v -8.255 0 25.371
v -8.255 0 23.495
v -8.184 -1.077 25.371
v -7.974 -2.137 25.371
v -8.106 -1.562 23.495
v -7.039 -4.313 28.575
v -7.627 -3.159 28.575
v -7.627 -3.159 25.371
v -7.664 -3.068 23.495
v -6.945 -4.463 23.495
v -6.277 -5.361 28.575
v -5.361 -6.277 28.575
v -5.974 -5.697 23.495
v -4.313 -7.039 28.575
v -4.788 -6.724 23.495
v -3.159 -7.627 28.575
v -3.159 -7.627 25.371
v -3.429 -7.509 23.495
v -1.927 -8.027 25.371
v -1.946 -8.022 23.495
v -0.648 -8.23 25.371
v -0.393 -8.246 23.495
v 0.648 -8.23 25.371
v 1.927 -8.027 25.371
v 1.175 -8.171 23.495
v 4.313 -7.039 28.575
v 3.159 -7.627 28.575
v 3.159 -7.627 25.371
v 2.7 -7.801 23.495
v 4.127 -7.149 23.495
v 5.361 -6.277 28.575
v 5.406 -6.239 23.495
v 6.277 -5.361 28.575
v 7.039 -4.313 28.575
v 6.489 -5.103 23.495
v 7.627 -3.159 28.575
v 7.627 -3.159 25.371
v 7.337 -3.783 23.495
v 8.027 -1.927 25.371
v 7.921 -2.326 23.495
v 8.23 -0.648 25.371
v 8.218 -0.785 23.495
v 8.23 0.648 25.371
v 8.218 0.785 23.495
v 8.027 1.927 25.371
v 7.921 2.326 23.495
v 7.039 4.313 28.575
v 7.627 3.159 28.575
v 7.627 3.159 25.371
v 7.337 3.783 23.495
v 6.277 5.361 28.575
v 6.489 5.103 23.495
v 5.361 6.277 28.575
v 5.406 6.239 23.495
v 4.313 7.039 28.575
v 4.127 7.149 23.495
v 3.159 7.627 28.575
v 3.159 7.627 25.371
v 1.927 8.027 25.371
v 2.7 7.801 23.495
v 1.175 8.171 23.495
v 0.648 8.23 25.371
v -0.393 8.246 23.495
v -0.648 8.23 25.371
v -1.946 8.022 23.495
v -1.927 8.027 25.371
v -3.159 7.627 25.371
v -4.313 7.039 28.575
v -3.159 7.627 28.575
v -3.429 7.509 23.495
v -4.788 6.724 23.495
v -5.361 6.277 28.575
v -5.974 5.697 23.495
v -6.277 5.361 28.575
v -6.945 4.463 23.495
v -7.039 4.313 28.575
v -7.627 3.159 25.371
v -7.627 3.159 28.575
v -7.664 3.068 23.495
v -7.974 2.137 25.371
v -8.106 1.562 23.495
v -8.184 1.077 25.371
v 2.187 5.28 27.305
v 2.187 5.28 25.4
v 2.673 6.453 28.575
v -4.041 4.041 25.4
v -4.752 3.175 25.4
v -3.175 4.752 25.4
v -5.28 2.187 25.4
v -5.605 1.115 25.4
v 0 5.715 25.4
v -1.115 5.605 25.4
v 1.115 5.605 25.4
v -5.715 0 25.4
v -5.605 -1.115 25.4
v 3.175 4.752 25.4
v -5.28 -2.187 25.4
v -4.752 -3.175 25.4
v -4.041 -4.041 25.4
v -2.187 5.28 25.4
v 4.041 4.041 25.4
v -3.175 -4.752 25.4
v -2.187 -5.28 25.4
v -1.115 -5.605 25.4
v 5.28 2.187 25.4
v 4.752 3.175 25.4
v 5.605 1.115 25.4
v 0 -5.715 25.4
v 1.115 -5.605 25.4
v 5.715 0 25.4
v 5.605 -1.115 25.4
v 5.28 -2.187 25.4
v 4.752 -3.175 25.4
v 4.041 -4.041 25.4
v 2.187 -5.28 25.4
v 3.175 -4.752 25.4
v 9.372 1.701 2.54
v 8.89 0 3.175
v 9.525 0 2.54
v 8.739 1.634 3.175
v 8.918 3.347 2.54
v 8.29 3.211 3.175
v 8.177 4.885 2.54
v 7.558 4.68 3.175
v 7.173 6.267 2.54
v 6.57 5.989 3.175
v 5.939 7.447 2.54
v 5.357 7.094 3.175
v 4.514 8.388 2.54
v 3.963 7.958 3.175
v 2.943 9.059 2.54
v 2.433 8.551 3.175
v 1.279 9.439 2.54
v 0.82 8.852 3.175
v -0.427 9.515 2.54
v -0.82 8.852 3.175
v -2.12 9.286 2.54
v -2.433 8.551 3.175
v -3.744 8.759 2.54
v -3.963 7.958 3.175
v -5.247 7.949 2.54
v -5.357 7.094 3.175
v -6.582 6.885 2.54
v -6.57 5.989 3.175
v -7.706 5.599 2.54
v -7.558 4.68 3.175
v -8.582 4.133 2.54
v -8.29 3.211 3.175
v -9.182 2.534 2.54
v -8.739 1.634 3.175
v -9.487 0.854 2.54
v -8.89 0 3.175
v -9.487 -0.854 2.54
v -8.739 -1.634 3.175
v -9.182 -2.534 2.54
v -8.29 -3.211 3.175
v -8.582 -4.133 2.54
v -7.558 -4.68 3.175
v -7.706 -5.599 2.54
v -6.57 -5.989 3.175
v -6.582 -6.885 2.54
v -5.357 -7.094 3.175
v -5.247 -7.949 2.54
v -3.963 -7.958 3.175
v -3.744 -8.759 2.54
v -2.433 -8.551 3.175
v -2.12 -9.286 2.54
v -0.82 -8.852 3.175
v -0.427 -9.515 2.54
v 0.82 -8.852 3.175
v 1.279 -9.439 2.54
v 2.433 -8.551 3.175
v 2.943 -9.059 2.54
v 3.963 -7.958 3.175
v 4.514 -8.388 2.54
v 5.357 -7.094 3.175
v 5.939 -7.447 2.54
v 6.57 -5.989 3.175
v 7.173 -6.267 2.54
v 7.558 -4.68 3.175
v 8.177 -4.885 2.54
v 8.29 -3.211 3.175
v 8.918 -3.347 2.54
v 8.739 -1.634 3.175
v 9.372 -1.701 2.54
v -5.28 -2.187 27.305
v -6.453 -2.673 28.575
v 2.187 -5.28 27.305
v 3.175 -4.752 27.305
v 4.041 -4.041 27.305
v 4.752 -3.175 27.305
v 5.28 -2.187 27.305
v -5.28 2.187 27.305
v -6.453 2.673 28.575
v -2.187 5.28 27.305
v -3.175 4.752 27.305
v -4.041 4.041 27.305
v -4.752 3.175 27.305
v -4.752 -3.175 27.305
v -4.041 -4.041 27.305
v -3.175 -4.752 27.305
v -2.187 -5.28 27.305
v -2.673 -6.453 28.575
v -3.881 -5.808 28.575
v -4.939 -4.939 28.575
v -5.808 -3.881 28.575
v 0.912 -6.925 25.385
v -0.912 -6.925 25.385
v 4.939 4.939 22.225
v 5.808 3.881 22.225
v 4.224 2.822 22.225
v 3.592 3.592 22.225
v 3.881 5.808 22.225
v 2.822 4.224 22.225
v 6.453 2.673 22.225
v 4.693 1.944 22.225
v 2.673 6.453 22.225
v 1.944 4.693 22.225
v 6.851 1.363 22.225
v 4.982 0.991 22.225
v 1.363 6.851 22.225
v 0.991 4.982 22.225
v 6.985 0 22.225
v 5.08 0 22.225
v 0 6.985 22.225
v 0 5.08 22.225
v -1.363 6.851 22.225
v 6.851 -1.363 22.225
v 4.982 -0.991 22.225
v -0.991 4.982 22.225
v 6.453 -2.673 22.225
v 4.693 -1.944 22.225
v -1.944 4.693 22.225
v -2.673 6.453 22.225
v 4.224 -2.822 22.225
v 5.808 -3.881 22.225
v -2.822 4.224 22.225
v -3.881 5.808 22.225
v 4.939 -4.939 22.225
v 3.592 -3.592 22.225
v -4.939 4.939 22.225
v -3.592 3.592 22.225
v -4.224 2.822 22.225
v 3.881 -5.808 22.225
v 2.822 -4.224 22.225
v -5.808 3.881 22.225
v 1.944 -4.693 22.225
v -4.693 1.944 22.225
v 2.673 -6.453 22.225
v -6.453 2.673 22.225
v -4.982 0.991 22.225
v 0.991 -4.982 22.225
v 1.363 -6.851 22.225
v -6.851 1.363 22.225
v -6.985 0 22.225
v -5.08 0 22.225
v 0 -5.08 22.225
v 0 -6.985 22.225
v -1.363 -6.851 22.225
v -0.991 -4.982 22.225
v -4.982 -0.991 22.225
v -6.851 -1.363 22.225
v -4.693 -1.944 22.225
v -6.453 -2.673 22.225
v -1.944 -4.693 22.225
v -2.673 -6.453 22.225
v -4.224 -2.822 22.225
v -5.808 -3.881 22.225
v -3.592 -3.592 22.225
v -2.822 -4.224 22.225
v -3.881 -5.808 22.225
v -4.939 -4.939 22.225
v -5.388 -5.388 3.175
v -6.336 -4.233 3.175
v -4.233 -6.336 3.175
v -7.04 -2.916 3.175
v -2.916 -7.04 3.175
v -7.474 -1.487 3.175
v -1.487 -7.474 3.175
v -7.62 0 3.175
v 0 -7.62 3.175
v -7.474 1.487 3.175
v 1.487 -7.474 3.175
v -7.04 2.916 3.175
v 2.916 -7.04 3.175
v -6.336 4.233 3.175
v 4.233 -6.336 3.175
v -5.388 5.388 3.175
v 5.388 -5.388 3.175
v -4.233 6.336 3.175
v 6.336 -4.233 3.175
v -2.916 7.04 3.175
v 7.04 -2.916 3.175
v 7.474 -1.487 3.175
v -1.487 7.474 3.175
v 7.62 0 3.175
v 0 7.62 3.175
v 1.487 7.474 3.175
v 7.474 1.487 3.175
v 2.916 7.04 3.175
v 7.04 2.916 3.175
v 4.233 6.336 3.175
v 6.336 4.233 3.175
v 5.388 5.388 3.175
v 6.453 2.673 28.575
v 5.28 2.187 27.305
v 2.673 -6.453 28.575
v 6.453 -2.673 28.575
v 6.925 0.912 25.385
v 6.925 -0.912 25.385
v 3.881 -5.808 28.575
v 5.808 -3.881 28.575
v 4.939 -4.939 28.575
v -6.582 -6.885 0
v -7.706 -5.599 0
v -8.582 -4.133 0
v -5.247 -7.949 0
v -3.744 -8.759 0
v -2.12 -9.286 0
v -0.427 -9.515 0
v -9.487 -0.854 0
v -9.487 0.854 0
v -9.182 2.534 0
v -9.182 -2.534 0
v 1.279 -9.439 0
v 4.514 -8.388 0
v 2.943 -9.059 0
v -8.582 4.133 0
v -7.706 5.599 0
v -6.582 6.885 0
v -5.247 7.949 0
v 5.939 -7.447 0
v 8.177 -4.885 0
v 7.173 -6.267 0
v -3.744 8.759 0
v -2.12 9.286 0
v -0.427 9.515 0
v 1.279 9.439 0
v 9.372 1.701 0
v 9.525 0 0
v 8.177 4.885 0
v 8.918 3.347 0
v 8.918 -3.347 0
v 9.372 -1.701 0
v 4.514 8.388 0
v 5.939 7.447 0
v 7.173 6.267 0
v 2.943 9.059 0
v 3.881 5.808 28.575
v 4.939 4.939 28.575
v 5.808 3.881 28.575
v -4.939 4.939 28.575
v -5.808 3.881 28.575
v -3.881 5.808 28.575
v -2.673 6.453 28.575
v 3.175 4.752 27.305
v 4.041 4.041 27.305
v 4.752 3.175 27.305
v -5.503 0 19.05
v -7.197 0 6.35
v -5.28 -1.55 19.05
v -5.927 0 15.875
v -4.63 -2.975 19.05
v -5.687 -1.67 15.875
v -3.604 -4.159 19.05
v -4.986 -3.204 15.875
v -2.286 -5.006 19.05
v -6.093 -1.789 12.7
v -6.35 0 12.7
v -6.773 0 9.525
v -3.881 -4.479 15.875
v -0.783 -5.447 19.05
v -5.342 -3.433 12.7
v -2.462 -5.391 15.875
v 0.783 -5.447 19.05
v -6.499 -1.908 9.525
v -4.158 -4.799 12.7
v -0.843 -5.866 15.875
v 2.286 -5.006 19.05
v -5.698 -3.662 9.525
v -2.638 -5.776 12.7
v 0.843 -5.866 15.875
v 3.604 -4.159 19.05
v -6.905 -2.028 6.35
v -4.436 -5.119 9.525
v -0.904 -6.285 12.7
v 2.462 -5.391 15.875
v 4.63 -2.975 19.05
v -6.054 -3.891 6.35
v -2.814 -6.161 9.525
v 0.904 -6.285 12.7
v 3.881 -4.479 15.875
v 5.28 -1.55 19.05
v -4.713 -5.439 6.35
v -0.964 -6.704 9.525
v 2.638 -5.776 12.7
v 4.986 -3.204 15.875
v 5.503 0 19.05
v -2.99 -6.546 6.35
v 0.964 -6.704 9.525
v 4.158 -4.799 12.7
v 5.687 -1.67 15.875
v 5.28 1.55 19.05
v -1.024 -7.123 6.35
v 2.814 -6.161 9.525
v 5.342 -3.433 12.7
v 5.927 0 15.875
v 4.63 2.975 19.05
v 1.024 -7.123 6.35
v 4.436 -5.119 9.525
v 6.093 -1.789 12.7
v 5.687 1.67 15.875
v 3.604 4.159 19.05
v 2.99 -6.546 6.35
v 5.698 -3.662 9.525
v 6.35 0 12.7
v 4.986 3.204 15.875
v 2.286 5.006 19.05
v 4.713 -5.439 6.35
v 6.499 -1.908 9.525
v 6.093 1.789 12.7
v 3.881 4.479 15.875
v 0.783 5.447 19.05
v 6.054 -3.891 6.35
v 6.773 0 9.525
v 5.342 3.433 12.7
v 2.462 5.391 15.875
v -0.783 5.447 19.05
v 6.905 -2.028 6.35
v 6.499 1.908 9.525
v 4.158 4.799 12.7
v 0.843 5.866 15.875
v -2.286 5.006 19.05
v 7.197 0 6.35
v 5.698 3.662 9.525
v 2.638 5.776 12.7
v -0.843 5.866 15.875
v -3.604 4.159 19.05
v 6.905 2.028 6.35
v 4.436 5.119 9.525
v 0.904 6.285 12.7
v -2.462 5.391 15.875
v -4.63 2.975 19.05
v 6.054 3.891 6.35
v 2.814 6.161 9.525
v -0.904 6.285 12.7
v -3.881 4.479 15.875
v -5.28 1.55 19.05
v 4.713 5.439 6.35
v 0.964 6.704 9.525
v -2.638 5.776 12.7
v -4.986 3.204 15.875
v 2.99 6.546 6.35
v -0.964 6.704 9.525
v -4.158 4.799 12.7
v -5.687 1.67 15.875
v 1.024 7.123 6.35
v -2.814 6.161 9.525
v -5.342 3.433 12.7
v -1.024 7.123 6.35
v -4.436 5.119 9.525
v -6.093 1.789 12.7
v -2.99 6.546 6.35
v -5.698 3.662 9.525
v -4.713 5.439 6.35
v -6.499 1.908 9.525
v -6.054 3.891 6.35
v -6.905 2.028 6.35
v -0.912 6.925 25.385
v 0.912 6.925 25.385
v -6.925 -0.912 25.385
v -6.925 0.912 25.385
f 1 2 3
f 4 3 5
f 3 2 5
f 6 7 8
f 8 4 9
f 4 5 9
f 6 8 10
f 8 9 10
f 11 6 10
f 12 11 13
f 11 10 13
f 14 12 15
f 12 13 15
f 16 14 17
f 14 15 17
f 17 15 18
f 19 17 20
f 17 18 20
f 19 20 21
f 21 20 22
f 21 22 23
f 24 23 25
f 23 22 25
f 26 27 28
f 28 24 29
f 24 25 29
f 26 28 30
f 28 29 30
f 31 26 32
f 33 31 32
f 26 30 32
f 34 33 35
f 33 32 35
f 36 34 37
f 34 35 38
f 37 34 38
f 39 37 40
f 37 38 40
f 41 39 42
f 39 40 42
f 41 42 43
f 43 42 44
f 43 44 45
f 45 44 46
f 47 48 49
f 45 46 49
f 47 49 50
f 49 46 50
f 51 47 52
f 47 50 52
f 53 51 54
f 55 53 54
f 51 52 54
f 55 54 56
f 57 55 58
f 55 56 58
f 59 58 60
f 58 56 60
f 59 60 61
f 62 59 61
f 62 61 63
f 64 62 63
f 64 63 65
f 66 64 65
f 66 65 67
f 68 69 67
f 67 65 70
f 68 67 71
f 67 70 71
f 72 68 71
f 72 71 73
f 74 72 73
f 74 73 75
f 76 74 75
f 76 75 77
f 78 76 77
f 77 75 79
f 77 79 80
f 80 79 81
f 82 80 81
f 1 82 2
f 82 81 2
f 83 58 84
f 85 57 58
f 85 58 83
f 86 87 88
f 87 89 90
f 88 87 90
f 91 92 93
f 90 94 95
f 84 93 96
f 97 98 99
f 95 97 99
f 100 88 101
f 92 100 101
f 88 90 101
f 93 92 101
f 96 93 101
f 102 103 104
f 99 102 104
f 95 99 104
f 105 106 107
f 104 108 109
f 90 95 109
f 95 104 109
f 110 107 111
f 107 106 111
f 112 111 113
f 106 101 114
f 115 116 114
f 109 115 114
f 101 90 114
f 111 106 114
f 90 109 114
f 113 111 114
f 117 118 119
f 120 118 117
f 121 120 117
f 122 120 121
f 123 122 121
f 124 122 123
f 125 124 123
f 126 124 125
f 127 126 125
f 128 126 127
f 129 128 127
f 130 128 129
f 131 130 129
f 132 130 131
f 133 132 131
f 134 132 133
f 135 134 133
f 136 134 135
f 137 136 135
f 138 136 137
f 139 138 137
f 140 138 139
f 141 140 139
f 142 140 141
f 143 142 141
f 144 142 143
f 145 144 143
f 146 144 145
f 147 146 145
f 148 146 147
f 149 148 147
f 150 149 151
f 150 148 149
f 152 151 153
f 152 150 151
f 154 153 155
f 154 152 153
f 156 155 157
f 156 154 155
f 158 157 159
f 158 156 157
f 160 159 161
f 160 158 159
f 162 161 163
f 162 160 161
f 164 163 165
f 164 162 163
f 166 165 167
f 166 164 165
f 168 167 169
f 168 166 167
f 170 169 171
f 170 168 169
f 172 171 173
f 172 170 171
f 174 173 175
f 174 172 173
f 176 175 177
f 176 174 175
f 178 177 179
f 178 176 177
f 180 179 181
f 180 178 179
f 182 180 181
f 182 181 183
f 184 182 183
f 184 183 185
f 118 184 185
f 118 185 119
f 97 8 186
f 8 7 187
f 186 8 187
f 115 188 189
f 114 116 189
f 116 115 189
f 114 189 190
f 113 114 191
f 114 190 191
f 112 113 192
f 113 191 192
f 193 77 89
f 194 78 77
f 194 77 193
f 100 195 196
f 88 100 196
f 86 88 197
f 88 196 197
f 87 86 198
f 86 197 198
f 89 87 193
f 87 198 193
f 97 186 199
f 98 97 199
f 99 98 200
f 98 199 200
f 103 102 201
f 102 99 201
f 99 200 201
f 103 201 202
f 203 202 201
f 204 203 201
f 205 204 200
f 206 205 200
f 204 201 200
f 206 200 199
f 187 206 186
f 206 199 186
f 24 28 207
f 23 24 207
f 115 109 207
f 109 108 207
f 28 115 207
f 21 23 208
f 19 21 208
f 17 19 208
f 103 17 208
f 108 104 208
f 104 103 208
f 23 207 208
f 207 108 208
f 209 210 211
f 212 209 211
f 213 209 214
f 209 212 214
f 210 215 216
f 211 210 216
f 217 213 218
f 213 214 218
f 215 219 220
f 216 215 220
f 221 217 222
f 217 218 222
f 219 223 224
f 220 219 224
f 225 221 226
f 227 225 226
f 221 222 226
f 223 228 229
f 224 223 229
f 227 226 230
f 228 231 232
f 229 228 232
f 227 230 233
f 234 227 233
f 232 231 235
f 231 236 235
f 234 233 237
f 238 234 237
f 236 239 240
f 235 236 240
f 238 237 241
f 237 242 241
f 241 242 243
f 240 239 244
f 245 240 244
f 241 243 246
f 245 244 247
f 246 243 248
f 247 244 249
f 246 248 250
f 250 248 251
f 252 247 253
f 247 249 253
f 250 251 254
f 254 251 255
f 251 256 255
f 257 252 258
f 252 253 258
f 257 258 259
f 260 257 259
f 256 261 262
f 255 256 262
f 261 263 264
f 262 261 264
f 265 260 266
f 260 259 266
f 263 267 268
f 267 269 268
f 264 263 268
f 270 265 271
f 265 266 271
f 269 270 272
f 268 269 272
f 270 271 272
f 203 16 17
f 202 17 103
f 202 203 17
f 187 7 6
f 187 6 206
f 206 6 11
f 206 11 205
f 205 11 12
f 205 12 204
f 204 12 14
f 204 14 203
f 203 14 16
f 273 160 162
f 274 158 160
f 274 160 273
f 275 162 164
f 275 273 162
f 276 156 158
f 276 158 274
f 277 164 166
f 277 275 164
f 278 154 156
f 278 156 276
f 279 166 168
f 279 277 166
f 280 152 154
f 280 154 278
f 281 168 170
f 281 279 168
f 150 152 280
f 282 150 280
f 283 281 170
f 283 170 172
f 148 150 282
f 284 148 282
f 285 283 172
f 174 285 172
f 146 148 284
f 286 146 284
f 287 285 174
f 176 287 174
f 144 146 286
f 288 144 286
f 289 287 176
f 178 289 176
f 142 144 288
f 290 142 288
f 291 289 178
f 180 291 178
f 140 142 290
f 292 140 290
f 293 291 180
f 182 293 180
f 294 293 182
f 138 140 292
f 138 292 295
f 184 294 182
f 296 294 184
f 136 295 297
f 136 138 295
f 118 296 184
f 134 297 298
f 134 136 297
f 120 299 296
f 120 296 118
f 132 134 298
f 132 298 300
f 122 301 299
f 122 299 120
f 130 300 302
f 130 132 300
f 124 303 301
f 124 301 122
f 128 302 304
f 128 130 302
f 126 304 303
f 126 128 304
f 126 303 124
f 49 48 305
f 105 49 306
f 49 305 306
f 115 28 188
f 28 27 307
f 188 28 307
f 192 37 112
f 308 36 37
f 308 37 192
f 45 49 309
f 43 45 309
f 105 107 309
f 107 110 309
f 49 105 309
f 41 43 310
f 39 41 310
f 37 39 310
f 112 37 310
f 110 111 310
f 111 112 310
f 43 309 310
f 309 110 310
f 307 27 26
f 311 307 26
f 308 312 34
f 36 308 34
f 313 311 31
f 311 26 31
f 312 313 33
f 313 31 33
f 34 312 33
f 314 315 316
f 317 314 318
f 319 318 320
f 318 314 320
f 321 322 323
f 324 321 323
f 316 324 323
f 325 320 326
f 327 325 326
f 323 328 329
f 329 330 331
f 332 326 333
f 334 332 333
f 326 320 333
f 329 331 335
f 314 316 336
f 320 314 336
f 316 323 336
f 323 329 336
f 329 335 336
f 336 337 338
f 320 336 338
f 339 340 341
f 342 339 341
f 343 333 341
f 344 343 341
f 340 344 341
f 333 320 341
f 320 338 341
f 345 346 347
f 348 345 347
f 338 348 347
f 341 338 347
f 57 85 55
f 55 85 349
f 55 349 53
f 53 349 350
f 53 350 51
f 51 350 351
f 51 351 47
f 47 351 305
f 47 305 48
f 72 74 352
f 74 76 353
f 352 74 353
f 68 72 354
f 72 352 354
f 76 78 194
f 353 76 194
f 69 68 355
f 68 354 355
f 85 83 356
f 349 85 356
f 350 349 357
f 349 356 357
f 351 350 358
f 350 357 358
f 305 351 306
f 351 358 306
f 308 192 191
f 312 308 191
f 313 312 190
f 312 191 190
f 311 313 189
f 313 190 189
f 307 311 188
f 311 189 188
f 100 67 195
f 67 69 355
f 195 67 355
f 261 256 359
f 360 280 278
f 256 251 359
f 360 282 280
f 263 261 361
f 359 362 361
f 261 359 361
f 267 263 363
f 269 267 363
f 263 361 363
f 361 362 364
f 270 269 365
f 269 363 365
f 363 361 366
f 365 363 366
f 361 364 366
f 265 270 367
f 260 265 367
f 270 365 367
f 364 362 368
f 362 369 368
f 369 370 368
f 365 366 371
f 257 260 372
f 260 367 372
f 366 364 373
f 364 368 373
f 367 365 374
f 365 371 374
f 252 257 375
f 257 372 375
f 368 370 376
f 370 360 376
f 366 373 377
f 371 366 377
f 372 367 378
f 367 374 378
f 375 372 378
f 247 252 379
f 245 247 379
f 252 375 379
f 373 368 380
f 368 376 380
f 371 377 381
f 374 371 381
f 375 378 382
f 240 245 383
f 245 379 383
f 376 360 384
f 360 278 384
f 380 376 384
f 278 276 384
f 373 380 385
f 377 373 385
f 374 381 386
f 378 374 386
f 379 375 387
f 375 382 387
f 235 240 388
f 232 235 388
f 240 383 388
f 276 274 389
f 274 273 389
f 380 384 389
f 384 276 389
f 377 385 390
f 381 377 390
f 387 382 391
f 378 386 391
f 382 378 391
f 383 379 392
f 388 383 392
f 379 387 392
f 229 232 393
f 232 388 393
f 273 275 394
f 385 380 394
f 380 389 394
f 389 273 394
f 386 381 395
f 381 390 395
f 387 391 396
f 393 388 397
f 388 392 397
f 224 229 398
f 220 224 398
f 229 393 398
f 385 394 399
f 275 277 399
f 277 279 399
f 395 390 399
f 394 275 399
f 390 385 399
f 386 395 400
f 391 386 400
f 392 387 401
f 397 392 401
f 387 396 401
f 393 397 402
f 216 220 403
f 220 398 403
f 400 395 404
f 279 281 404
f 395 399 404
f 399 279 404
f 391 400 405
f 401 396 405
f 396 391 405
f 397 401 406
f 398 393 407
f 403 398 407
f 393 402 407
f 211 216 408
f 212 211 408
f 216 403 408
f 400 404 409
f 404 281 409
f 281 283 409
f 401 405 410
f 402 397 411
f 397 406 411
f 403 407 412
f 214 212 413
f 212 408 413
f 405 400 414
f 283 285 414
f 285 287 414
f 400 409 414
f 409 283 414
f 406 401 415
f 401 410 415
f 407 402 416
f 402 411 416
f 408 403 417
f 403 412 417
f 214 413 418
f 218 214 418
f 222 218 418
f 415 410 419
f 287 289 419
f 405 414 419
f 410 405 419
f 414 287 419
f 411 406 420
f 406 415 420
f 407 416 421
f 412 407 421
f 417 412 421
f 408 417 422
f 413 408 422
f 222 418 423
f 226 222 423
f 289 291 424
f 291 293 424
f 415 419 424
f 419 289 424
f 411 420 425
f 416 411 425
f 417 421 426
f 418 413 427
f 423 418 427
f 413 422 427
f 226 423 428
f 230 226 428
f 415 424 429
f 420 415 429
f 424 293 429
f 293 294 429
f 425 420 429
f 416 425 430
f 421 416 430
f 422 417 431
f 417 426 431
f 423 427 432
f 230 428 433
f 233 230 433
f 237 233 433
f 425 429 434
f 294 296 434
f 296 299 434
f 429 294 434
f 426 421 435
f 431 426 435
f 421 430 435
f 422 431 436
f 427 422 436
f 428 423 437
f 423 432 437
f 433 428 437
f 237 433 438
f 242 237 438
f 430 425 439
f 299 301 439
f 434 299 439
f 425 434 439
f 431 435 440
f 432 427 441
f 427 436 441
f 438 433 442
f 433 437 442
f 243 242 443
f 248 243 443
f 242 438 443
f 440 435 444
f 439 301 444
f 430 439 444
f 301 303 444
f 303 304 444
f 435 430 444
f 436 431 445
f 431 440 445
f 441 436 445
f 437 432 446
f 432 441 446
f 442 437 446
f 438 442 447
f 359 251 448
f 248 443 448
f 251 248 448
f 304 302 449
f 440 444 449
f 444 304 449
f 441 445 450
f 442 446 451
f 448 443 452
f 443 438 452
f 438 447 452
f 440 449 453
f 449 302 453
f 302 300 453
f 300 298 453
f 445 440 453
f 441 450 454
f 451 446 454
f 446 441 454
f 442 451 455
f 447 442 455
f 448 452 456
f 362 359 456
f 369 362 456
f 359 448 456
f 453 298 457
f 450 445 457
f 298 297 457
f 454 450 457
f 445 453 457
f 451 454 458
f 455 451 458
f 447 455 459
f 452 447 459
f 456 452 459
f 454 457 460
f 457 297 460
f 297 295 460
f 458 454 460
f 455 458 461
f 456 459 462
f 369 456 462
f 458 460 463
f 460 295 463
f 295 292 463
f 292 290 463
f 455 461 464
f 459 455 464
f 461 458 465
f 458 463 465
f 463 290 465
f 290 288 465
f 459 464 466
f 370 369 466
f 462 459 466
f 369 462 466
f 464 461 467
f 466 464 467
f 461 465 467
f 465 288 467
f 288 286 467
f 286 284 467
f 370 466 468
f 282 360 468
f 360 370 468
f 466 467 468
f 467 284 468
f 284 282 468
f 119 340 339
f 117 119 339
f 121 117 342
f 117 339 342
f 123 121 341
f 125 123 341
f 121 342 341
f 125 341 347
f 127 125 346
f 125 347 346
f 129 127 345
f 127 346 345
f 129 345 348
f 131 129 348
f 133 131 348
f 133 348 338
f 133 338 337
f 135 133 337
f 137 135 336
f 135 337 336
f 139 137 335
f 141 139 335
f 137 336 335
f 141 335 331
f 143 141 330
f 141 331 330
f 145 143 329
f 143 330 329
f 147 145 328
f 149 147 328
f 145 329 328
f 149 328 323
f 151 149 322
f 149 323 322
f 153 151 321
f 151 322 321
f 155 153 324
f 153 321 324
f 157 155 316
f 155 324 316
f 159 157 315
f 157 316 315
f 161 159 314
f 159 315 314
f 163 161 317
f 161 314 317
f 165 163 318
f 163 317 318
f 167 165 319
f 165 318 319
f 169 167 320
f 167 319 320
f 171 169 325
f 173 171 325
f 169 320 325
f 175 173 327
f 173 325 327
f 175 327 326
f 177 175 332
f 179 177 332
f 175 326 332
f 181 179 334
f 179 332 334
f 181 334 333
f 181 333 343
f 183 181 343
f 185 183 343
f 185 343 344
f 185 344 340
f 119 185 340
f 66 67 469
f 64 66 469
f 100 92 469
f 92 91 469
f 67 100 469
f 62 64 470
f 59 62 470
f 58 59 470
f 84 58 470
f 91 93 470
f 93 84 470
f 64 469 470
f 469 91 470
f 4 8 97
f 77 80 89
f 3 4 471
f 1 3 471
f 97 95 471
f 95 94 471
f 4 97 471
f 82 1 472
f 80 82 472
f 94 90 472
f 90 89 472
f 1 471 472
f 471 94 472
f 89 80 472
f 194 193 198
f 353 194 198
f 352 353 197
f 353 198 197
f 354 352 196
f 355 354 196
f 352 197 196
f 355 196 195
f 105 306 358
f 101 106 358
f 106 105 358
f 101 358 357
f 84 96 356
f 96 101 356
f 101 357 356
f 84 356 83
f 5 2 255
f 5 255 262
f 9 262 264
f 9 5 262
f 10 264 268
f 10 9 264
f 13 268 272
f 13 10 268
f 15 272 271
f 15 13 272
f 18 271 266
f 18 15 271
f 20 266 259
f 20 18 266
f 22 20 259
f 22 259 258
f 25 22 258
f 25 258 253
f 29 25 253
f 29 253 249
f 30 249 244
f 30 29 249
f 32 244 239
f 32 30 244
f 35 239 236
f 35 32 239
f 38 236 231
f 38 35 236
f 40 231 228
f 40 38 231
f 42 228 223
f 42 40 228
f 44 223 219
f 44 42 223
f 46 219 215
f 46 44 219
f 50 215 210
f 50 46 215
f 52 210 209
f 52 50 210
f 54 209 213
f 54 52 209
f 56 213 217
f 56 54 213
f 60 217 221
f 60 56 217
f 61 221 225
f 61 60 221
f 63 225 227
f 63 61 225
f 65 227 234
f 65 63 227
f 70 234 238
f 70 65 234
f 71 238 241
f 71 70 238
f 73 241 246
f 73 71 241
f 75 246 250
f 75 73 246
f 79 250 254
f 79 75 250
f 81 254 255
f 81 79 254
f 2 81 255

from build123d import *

# Parameters (mm, degrees)
F0_R            = 9.525
F1_DEPTH        = 3.175
F2_SIZE         = 0.635
F6_ANGLE_BACK   = 22.5
F6_ANGLE        = 45
F6_COPIES_COUNT = 4
F7_SIZE         = 1.27
F8_SIZE         = 1.27


# Not quite as in the source:
# - a pattern or mirror of a feature is missing from the dataset's text; its kind, count and spacing are read off the source's solid


with BuildPart() as f1:
    # F0 (on Top) → F1 (new body)
    with BuildSketch(Plane.XY):
        Circle(F0_R)
    extrude(amount=F1_DEPTH)

    # F2
    f2_edges = [f1.edges().sort_by_distance(p)[0] for p in [
        (-9.525, 0, 3.175),
    ]]
    chamfer(f2_edges, length=F2_SIZE)

    # F3 (on Front) → F4 (revolve)
    with BuildSketch(Plane.XZ):
        Polygon((-5.08, 22.225), (-7.62, 3.175), (0, 3.175), (0, 22.225), (0, 25.4), (-5.715, 25.4), (-5.715, 28.575), (-8.255, 28.575), (-8.255, 22.225), align=None)
    revolve(axis=Axis((0, 0, 12.7), (0, 0, 1)))

    # F5 (on Right) → F6 (revolve, cut)
    with BuildSketch(Plane.YZ, mode=Mode.PRIVATE) as f6_sk:
        Polygon((-5.715, 25.4), (-5.715, 28.575), (-8.255, 28.575), (-8.255, 25.3708213568), align=None)
    f6 = revolve(f6_sk.sketch.rotate(Axis((0, 0, 12.7), (0, 0, -1)), -F6_ANGLE_BACK), axis=Axis((0, 0, 12.7), (0, 0, -1)), revolution_arc=F6_ANGLE, mode=Mode.SUBTRACT)

    # F6_copies: F6 ×4 about axis
    f6_copies_axis = Axis((0, 0, 0), (0, 0, 1))
    for i in range(1, F6_COPIES_COUNT):
        add(f6.rotate(f6_copies_axis, i * 360 / F6_COPIES_COUNT), mode=Mode.SUBTRACT)

    # F7
    f7_edges = [f1.edges().sort_by_distance(p)[0] for p in [
        (8.255, 0, 22.225),
    ]]
    chamfer(f7_edges, length=F7_SIZE)

    # F8
    f8_edges = [f1.edges().sort_by_distance(p)[0] for p in [
        (-4.041115, -4.041115, 28.575),
        (-4.041115, 4.041115, 28.575),
        (4.041115, -4.041115, 28.575),
        (4.041115, 4.041115, 28.575),
    ]]
    chamfer(f8_edges, length=F8_SIZE)


solid = f1.part
